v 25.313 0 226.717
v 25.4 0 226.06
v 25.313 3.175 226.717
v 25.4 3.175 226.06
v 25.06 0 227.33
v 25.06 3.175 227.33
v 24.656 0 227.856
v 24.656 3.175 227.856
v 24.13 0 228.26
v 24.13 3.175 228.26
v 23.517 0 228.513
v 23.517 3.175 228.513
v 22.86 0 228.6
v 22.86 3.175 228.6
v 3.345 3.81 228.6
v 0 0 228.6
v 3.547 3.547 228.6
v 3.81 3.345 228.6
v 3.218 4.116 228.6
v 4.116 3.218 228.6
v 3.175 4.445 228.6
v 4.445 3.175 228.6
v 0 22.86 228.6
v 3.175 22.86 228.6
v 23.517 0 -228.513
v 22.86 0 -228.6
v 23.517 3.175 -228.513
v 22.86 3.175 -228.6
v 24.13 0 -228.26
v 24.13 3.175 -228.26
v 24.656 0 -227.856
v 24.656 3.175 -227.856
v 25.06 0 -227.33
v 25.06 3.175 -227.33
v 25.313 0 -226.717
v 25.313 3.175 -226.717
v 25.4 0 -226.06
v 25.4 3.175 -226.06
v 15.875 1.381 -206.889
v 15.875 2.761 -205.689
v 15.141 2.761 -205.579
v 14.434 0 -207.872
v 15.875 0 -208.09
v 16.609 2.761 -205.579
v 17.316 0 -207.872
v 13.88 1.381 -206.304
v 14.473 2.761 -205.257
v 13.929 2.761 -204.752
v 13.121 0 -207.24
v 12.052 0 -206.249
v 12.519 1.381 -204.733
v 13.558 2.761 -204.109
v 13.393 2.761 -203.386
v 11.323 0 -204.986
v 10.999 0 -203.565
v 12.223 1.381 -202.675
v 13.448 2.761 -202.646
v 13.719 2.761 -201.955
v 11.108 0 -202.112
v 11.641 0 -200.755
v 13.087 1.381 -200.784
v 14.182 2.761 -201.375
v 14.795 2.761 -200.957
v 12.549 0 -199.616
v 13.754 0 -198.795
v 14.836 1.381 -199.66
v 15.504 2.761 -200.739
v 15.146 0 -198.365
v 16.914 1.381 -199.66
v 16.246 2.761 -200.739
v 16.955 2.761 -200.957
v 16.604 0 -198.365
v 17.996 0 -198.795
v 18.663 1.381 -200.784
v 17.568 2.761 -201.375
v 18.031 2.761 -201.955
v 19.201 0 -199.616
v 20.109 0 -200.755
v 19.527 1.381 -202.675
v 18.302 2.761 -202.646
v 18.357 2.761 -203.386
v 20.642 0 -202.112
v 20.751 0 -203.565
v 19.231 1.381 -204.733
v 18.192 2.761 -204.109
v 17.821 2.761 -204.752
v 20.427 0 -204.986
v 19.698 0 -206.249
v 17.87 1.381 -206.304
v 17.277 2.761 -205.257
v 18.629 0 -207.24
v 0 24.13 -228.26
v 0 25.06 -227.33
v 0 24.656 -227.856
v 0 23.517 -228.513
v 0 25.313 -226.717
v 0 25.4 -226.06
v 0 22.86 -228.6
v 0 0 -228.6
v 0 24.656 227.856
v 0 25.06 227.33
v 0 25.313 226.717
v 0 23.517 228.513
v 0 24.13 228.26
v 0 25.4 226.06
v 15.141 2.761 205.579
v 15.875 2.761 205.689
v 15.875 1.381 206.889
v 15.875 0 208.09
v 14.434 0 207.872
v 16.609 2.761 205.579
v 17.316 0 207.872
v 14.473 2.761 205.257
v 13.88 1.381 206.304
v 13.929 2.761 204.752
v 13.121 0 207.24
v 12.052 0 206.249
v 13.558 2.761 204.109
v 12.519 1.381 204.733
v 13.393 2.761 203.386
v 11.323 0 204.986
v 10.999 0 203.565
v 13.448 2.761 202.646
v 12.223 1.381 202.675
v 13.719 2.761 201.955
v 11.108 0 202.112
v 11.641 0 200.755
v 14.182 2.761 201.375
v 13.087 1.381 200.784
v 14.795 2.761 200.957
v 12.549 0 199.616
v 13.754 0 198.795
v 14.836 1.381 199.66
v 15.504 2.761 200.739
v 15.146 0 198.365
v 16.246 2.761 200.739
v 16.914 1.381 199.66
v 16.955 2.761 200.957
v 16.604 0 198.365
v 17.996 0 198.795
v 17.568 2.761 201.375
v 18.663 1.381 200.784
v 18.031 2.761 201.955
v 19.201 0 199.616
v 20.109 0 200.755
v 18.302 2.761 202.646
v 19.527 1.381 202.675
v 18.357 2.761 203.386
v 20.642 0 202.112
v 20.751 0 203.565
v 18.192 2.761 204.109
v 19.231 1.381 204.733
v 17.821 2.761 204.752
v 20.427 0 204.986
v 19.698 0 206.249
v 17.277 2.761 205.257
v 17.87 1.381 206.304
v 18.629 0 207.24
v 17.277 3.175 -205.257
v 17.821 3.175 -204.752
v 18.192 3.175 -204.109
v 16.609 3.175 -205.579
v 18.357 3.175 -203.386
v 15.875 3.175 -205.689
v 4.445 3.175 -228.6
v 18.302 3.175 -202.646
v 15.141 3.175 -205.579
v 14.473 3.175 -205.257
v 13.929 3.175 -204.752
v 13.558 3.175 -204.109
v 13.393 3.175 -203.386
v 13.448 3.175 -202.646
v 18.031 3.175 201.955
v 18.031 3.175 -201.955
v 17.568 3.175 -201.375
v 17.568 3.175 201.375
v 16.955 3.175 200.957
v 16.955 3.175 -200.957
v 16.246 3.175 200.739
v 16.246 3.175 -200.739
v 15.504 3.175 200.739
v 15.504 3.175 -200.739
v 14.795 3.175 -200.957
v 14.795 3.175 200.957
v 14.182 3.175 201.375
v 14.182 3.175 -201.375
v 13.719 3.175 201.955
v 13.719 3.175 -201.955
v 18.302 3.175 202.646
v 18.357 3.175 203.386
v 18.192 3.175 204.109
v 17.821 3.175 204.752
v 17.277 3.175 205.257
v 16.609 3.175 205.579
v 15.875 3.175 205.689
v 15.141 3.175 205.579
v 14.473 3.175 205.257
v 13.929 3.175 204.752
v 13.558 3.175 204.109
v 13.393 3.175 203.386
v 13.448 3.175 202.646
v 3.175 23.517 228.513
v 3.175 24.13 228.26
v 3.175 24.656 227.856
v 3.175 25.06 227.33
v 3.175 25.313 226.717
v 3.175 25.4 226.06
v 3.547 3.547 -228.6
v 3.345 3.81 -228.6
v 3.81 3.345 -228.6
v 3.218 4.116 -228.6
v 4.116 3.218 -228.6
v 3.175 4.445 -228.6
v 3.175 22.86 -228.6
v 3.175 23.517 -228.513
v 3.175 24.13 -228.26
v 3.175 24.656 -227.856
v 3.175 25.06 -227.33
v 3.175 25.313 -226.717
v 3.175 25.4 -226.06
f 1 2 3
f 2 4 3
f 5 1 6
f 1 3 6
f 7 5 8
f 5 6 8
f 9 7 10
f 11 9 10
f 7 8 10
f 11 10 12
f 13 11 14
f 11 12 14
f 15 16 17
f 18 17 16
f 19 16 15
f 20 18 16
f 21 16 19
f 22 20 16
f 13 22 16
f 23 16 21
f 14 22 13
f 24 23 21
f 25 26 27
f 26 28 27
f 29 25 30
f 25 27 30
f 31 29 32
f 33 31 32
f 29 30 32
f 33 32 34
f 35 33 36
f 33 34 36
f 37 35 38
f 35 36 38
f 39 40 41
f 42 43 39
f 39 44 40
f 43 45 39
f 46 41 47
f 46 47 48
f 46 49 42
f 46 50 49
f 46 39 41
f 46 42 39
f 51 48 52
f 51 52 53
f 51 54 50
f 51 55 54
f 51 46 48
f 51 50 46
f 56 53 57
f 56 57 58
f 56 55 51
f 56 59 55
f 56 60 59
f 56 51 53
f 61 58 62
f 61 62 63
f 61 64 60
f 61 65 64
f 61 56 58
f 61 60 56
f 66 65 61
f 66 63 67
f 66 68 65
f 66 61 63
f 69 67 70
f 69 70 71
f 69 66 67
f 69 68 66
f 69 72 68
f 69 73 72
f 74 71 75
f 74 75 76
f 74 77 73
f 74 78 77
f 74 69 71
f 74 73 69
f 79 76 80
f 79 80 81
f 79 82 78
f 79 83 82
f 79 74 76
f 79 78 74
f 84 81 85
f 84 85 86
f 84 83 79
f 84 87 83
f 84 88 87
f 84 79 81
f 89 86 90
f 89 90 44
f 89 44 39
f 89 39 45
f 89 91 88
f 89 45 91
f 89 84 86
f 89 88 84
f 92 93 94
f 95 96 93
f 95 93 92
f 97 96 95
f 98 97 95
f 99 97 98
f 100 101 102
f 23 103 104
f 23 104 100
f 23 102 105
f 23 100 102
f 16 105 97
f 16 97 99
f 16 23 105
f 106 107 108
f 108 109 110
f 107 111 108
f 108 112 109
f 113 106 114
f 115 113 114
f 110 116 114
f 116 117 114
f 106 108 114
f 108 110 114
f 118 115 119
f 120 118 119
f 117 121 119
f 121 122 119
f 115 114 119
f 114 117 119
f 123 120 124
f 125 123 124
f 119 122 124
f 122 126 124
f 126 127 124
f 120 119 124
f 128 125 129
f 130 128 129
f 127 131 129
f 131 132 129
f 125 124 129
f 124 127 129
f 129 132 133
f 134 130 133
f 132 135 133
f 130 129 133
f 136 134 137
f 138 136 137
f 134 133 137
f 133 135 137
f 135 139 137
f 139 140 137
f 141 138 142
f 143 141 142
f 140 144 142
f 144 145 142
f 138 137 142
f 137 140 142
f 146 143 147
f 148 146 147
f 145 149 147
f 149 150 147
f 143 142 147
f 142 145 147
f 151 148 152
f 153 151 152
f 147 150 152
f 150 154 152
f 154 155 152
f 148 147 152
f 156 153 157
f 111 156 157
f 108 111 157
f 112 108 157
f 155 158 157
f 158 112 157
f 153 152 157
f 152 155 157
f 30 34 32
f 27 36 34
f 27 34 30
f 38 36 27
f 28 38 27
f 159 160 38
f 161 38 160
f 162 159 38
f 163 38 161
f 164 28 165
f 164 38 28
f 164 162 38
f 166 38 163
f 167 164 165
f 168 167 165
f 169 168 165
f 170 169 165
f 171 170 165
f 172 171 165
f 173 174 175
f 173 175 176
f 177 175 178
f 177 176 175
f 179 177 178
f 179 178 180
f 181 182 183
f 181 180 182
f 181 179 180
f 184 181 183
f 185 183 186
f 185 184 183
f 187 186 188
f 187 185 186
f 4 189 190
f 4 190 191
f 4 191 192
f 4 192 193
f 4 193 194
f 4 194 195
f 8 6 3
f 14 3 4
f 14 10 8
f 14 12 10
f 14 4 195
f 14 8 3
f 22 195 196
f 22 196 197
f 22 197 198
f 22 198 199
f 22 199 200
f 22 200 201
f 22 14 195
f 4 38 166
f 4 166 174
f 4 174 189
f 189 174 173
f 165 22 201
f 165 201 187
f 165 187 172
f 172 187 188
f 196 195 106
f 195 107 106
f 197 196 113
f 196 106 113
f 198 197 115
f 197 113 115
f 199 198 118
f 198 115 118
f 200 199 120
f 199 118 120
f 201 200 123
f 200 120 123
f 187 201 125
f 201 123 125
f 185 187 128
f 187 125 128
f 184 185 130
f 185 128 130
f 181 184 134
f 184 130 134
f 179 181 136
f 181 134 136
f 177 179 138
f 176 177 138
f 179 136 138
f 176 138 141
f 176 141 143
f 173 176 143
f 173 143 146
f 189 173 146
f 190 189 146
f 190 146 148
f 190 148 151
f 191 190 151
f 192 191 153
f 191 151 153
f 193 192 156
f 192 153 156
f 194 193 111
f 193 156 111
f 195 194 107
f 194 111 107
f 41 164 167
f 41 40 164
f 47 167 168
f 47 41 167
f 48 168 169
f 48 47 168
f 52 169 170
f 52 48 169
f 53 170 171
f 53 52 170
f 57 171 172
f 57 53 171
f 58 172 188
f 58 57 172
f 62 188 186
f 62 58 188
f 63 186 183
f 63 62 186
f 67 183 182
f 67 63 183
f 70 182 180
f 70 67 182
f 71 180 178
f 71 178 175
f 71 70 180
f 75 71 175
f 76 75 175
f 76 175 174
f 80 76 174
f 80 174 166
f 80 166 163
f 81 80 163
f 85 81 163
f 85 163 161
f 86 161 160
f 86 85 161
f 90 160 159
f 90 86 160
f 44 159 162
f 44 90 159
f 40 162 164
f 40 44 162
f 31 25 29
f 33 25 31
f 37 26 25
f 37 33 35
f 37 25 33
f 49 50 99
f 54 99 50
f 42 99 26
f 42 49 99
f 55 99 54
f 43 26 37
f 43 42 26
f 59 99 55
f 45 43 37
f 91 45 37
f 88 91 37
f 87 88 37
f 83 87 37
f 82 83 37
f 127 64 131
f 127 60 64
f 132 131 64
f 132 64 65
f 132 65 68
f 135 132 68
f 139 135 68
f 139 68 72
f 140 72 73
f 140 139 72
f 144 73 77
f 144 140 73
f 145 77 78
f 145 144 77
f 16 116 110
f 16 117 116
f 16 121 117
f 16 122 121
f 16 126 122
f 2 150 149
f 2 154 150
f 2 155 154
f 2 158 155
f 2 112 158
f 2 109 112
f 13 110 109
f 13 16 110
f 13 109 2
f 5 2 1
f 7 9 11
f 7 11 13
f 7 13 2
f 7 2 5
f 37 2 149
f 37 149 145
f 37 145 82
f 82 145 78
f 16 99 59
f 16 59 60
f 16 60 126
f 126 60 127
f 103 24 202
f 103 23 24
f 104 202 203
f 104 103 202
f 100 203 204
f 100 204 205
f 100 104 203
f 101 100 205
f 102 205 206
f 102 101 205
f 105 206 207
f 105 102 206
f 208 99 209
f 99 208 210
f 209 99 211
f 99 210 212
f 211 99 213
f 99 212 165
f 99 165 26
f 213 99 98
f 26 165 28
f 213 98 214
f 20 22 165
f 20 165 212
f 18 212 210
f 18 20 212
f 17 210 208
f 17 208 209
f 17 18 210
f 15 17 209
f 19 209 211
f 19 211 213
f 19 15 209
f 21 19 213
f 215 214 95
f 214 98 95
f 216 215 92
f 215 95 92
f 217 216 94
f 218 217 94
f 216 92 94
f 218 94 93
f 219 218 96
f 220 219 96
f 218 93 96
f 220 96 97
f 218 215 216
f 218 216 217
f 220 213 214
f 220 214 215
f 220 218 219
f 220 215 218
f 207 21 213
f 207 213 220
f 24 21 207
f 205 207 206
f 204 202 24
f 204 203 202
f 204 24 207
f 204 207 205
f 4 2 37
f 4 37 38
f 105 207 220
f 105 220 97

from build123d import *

# Parameters (mm, degrees)
BOSS_EXTRUDE1_DEPTH = 228.6
FILLET1_R           = 2.54


with BuildPart() as part:
    # Sketch1 → Boss-Extrude1 (new, symmetric)
    with BuildSketch(Plane.XY):
        with BuildLine():
            Line((0, 0), (25.4, 0))
            Line((25.4, 0), (25.4, 3.175))
            Line((25.4, 3.175), (4.445, 3.175))
            ThreePointArc((4.445, 3.175), (3.546974388, 3.546974388), (3.175, 4.445))
            Line((3.175, 4.445), (3.175, 25.400000027))
            Line((3.175, 25.400000027), (0, 25.400000027))
            Line((0, 25.400000027), (0, 0))
        make_face()
    extrude(amount=BOSS_EXTRUDE1_DEPTH, both=True)

    # Sketch3 → CSK for #10 Flat Head Machine Screw1 (revolve, cut)
    with BuildSketch(Plane(origin=(15.875, 0, -203.2), x_dir=(0, 0, -1), z_dir=(1, 0, 0))):
        Polygon((0, 0), (0, 3.175), (2.4892, 3.175), (2.4892, 2.761229288), (4.8895, 0), align=None)
    csk_for_10_flat_head_machine_screw1 = revolve(axis=Axis((15.875, -6.35, -203.2), (0, 1, 0)), mode=Mode.SUBTRACT)

    # Mirror1: CSK for #10 Flat Head Machine Screw1 across plane
    add(csk_for_10_flat_head_machine_screw1.mirror(Plane.XY), mode=Mode.SUBTRACT)

    # Fillet1
    fillet1_edges = [part.edges().sort_by_distance(p)[0] for p in [
        (25.4, 1.5875, 228.6),
        (1.5875, 25.400000027, 228.6),
        (1.5875, 25.400000027, -228.6),
        (25.4, 1.5875, -228.6),
    ]]
    fillet(fillet1_edges, radius=FILLET1_R)


solid = part.part
